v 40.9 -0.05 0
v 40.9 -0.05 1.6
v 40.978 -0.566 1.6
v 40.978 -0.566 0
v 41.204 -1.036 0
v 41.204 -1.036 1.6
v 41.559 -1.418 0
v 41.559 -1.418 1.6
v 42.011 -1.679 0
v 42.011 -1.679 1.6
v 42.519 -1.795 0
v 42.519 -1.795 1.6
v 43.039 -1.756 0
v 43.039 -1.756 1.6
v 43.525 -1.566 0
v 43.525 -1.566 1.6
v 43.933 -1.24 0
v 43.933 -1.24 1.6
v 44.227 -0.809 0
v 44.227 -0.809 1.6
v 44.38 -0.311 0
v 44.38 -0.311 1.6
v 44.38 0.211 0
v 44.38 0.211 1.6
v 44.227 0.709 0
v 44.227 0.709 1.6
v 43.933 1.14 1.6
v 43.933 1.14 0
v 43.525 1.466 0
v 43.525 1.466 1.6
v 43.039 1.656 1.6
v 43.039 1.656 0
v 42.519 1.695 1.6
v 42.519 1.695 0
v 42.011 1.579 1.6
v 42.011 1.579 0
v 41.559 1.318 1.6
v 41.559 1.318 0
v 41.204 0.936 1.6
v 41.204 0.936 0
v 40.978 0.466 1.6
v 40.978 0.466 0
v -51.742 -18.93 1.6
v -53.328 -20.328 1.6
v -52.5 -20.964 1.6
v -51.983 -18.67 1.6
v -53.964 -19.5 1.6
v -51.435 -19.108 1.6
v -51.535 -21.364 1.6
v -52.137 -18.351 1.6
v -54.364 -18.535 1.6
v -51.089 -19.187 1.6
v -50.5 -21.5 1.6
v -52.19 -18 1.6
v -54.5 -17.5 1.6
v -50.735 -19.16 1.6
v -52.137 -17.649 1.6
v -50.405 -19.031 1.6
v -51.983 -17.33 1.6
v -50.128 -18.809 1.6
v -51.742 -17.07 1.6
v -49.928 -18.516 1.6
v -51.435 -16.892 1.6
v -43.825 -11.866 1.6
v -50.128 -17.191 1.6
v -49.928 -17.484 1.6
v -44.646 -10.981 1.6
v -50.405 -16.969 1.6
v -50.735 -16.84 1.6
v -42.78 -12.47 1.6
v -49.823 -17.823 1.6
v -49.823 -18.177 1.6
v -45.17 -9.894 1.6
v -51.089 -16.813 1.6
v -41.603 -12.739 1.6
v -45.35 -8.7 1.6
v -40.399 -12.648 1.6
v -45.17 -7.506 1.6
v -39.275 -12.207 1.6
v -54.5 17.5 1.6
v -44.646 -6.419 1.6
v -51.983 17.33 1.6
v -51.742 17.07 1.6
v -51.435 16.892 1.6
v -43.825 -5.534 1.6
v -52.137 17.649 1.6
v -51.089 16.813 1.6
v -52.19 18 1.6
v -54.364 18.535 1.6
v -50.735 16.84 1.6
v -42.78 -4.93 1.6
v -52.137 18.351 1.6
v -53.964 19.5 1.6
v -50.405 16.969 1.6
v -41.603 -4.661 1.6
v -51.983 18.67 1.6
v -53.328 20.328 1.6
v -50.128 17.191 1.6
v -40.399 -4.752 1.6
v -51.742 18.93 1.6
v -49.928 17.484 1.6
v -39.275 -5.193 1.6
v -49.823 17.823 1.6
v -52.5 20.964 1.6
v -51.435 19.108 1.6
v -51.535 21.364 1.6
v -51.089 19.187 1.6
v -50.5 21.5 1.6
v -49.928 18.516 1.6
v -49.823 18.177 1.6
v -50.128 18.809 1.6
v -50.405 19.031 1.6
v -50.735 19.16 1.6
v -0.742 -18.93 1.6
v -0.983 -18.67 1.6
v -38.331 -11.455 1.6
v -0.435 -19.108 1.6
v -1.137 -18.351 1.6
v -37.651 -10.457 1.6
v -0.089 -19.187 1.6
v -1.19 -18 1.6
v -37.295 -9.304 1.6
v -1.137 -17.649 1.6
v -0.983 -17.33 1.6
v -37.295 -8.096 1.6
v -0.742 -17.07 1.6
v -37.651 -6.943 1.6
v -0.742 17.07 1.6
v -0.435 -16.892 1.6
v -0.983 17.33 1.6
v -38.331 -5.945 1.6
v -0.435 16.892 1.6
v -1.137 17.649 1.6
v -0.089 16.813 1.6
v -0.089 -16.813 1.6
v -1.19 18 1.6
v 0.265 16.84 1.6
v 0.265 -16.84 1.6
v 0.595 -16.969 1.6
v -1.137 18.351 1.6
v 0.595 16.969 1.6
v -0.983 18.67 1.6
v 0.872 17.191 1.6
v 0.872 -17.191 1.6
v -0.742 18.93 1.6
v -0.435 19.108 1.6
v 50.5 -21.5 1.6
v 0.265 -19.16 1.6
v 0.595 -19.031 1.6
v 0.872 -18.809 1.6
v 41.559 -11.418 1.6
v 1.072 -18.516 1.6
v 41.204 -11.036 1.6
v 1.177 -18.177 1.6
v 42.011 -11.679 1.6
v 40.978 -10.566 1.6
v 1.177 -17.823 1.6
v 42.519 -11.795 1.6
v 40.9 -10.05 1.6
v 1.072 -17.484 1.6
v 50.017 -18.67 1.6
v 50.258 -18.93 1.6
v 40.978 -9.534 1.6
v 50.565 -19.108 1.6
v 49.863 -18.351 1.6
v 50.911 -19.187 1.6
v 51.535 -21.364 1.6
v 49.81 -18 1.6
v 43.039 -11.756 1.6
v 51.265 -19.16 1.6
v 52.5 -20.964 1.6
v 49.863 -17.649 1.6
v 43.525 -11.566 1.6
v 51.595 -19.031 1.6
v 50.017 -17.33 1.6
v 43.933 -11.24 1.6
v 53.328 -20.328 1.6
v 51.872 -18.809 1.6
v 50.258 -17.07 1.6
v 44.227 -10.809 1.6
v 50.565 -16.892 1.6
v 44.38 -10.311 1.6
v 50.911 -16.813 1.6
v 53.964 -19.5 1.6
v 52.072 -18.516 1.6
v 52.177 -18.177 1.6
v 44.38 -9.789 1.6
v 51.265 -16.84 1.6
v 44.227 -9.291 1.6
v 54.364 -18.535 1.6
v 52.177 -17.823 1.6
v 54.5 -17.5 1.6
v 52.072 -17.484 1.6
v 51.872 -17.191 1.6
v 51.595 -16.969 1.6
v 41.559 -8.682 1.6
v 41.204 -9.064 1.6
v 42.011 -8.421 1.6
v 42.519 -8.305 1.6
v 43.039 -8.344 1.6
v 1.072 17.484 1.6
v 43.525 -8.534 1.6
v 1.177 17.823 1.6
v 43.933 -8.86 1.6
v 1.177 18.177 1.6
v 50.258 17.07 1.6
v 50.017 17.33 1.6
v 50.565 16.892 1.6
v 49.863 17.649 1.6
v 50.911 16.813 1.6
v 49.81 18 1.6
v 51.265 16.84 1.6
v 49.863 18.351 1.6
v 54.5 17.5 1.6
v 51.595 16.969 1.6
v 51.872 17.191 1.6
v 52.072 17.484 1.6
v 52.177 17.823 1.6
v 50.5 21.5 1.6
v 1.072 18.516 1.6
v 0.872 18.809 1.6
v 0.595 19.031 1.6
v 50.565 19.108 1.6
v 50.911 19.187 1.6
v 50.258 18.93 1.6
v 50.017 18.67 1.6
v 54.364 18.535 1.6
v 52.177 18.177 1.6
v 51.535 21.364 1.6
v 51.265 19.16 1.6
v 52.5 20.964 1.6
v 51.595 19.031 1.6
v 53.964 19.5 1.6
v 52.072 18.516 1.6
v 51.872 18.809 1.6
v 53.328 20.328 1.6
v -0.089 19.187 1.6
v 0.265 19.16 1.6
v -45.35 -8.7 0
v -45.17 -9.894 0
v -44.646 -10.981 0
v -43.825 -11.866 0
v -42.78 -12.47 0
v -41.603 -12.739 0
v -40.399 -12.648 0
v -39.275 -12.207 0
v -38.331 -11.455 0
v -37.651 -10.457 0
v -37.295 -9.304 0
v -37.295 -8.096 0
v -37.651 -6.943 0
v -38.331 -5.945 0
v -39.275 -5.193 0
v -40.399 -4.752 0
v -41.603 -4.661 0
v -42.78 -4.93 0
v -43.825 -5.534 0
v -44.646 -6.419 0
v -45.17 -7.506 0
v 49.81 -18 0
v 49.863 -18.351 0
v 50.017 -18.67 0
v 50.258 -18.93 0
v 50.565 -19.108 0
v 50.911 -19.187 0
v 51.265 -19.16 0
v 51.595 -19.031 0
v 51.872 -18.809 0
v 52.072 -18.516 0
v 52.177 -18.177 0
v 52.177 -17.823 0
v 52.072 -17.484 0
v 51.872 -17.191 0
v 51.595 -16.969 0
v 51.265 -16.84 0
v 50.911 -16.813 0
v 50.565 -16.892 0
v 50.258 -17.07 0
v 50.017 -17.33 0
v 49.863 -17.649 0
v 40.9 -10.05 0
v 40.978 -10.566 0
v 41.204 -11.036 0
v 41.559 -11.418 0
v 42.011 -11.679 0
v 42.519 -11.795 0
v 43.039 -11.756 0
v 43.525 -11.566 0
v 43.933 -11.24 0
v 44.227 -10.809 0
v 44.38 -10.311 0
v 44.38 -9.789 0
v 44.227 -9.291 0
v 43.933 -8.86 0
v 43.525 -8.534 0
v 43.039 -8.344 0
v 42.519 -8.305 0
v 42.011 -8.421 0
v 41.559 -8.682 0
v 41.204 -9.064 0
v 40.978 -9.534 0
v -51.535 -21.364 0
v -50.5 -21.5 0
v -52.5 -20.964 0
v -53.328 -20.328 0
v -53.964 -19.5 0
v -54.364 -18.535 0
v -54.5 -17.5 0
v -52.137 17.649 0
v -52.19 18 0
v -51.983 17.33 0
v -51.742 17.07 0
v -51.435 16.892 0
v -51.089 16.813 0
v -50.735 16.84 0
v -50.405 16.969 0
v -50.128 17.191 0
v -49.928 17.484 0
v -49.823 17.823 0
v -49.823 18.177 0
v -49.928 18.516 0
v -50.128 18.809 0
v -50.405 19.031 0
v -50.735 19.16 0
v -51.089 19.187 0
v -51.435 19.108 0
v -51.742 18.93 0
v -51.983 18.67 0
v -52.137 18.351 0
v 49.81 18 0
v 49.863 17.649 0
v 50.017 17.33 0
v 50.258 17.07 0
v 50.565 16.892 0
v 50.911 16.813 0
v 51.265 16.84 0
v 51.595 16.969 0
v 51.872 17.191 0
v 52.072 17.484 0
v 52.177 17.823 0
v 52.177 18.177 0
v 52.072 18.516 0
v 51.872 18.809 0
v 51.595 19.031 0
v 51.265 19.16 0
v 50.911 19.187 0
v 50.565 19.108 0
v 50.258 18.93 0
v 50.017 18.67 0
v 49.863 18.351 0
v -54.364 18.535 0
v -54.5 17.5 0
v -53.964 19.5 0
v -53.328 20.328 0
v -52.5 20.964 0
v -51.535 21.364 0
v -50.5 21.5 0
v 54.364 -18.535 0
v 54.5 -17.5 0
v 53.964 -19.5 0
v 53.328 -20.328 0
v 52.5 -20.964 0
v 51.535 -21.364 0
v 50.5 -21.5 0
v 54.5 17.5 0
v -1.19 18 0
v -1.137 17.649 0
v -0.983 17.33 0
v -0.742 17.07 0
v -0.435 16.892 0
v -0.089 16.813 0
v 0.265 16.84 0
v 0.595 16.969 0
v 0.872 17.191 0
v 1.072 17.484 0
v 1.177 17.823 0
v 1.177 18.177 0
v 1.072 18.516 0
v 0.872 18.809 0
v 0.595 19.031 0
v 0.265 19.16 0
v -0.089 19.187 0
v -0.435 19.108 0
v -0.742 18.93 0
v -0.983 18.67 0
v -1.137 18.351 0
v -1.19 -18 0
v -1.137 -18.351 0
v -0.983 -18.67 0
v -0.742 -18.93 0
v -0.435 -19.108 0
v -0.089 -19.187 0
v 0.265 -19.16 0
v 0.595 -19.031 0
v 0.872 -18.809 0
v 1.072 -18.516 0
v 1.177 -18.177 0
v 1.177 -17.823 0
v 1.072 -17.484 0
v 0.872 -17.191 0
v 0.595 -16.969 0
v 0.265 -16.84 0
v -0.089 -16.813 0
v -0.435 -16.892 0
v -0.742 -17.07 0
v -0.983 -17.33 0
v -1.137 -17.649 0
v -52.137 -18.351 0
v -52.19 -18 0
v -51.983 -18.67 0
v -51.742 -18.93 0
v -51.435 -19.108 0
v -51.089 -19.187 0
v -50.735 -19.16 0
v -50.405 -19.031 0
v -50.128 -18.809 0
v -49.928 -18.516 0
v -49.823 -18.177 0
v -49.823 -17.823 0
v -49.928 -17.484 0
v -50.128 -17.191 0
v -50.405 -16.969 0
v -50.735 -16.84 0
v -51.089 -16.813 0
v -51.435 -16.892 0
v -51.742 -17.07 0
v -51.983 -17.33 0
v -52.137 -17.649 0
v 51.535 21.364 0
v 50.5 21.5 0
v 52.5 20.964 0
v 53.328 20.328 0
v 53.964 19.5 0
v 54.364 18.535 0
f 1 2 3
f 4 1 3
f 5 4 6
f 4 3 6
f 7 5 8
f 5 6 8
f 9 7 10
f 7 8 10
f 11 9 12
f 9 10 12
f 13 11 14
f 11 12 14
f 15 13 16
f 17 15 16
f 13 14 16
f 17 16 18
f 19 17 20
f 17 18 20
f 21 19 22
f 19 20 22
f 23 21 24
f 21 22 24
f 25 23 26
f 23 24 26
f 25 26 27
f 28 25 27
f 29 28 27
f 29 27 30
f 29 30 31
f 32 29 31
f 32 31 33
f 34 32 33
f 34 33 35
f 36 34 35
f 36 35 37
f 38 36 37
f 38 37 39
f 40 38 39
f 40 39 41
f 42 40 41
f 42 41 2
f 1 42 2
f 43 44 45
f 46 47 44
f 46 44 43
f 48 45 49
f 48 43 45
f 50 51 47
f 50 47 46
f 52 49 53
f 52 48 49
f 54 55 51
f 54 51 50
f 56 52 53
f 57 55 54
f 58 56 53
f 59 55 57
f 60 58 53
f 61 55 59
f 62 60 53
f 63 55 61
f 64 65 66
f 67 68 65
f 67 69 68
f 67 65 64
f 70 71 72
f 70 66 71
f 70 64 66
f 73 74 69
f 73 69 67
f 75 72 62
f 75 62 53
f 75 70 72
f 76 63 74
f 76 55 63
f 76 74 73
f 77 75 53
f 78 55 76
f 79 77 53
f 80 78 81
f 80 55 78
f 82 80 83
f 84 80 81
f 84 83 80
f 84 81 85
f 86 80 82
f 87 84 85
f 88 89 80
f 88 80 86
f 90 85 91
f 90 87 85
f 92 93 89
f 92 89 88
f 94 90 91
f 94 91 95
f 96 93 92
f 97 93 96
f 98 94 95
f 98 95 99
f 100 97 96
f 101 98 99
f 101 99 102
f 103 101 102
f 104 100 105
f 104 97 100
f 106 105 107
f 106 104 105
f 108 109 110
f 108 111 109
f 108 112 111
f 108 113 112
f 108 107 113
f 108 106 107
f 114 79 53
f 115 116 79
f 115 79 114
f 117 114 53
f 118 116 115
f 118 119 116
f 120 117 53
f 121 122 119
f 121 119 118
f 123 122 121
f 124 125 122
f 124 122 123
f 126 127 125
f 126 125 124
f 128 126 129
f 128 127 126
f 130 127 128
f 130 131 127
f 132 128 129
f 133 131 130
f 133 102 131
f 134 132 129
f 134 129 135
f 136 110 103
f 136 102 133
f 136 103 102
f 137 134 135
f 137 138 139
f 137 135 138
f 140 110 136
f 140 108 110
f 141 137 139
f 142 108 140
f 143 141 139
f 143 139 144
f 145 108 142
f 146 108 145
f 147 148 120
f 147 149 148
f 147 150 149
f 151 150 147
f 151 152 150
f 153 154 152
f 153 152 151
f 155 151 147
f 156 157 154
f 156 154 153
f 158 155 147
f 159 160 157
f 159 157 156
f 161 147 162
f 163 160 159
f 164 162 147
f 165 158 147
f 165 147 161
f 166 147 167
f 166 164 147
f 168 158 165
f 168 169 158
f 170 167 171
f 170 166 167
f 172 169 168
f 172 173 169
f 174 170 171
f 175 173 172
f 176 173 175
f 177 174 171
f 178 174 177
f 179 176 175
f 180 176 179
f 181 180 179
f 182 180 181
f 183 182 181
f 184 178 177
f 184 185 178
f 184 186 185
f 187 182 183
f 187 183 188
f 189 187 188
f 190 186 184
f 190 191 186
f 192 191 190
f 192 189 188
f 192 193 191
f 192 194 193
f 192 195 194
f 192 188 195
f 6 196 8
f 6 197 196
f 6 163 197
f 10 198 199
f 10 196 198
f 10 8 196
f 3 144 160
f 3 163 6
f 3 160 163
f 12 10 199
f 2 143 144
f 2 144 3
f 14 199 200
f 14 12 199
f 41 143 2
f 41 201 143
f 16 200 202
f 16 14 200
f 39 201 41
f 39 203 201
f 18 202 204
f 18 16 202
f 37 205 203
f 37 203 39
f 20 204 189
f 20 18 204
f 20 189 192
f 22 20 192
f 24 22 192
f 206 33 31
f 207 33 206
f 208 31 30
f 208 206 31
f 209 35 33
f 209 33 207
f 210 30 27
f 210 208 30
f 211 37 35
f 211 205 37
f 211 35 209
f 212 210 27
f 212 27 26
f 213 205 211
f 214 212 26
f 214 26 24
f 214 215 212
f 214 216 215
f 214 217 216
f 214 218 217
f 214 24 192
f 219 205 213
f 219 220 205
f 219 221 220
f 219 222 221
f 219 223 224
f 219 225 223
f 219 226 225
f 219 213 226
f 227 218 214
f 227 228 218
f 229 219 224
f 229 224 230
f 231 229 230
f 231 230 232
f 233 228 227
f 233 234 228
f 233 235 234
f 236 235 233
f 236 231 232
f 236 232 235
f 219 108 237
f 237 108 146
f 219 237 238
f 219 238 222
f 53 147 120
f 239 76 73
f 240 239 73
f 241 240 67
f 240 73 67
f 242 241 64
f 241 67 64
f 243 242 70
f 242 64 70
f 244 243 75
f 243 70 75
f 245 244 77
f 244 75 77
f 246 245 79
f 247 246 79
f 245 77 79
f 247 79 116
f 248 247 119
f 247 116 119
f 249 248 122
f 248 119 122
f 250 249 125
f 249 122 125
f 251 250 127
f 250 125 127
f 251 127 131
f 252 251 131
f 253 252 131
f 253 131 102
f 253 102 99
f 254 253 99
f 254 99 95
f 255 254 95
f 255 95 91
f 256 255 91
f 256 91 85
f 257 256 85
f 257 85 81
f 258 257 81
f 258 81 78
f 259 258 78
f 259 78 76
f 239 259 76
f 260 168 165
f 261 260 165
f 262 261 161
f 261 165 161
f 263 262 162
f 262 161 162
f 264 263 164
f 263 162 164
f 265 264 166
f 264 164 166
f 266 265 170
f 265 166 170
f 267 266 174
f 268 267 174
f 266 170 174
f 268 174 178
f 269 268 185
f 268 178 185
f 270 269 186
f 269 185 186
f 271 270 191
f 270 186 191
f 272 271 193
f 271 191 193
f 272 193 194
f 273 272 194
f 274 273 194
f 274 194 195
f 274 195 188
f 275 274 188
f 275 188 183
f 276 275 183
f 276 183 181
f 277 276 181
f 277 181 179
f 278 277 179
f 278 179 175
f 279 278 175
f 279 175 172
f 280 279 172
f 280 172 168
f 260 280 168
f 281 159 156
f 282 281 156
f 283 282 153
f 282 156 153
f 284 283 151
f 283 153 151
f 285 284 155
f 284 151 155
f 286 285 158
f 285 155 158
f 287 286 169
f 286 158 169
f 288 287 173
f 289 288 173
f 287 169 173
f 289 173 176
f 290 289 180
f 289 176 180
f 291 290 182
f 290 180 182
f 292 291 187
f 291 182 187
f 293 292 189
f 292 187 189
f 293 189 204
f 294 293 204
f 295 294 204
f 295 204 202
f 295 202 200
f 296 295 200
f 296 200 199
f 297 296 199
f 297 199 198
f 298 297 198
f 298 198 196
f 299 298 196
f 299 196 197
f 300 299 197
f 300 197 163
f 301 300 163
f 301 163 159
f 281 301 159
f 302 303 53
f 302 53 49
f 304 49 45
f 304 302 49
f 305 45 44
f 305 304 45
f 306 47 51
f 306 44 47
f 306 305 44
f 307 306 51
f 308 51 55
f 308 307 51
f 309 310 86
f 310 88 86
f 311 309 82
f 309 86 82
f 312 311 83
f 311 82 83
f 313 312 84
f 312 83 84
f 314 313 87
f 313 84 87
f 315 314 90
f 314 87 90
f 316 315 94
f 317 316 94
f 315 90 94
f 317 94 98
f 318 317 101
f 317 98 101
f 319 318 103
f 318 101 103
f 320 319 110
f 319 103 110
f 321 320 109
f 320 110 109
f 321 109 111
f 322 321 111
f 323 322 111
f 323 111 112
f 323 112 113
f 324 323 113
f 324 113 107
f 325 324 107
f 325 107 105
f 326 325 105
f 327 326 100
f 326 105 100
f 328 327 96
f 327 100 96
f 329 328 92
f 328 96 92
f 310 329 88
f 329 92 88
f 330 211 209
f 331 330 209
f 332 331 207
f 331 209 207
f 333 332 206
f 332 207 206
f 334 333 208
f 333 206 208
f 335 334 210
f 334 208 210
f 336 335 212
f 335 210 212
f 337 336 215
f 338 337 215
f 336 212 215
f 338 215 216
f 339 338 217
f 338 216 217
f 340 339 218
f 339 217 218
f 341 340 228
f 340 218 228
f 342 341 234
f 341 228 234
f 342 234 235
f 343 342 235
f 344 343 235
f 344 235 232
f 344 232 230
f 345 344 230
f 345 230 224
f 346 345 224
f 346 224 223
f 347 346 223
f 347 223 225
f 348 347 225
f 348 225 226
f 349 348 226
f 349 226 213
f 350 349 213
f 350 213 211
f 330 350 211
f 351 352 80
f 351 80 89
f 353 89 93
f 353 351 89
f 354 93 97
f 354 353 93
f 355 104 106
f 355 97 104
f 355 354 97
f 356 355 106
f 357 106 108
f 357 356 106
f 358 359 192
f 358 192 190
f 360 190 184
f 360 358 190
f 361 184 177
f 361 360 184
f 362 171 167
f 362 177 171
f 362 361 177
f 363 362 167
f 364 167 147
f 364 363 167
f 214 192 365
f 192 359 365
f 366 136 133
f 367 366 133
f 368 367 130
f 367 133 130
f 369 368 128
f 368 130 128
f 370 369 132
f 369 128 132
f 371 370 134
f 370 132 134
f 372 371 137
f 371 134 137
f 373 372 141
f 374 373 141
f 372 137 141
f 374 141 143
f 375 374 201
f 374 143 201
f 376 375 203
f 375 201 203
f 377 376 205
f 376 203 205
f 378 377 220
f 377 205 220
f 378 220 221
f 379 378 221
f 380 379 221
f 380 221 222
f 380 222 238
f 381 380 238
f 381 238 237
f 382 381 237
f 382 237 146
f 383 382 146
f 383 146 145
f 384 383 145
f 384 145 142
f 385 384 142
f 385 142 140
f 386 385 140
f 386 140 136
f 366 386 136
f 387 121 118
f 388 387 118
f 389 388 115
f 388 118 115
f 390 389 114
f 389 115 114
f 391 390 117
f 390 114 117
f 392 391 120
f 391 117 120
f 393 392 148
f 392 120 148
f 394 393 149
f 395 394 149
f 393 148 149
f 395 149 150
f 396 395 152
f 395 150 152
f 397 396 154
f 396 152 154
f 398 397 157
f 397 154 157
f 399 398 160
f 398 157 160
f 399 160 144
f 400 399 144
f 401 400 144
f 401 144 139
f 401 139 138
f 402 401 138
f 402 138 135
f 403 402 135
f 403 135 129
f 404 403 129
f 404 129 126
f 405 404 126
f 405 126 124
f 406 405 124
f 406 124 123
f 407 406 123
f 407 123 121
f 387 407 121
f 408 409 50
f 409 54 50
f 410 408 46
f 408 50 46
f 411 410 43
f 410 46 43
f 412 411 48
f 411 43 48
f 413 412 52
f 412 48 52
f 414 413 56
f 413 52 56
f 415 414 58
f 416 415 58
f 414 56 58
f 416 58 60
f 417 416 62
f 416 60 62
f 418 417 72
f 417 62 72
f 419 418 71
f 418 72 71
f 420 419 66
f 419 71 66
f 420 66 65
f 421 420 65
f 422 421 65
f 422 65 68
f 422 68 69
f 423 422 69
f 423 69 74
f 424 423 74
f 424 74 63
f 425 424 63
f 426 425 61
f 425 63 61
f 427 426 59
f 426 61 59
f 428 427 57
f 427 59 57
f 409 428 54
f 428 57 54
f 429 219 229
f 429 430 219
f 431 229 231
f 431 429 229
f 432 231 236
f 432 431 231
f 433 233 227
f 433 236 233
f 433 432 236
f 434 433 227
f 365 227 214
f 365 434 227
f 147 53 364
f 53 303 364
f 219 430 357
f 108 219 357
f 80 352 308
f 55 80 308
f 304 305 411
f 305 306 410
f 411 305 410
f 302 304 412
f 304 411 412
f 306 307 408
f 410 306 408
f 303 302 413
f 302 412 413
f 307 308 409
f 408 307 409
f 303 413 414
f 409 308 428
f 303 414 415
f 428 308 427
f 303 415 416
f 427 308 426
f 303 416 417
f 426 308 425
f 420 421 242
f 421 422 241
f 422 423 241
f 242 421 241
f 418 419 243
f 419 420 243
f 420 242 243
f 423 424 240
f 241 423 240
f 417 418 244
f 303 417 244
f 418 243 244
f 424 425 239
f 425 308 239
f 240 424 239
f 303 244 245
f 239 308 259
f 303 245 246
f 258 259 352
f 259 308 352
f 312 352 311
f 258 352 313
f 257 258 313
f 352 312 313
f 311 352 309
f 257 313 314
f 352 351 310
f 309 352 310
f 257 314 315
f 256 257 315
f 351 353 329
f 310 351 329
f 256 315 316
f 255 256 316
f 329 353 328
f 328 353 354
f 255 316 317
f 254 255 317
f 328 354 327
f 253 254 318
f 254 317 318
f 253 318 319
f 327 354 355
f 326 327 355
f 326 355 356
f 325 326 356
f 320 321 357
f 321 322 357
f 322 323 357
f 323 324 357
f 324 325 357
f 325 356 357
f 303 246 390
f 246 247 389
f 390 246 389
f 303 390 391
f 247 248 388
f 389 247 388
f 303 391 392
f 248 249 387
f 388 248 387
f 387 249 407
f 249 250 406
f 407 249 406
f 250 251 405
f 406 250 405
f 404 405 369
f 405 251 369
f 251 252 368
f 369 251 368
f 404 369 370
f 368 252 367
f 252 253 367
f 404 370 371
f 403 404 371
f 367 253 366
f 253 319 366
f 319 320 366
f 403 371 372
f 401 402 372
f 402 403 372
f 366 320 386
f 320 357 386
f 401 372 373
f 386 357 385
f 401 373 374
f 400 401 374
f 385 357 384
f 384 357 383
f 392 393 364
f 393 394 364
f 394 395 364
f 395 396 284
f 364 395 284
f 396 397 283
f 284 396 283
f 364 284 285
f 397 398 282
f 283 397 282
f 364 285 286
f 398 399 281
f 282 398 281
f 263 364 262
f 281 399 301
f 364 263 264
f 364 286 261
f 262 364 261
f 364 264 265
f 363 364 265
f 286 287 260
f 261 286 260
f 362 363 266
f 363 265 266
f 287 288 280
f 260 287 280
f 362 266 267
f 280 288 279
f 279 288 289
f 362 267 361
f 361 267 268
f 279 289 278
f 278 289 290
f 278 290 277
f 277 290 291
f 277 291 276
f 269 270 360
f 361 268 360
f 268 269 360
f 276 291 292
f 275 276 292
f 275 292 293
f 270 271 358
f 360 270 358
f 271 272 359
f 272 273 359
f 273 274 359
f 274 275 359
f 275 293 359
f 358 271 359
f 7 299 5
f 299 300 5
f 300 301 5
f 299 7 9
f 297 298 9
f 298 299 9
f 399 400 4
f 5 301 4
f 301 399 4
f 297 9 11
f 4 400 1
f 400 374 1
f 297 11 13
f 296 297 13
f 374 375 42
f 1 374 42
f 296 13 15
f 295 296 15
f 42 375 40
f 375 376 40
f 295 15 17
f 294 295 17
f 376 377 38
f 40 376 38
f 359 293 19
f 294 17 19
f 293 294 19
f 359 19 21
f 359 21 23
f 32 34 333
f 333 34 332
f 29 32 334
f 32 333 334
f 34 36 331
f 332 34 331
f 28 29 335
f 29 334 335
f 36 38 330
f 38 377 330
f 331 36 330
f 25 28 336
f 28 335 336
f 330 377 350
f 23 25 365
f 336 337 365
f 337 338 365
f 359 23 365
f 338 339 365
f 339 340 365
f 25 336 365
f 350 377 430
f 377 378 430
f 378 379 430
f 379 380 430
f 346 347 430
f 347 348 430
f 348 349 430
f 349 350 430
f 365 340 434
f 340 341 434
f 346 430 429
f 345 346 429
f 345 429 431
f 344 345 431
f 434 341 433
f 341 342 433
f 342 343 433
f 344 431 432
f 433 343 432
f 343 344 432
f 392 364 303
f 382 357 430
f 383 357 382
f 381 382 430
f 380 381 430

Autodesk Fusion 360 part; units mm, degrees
sketch "Main Body" plane through (0, 0, 0) normal (0, 0, 1) x (1, 0, 0)
  line L0 (50.5, 21.5) -> (-50.5, 21.5)
  line L1 (-54.5, 17.5) -> (-54.5, -17.5)
  line L2 (-50.5, -21.5) -> (50.5, -21.5)
  line L3 (54.5, -17.5) -> (54.5, 17.5)
  arc A0 (-50.5, 21.5) -> (-54.5, 17.5) centre (-50.5, 17.5) ccw
  arc A1 (-54.5, -17.5) -> (-50.5, -21.5) centre (-50.5, -17.5) ccw
  arc A2 (50.5, -21.5) -> (54.5, -17.5) centre (50.5, -17.5) ccw
  arc A3 (54.5, 17.5) -> (50.5, 21.5) centre (50.5, 17.5) ccw
  line L4 (-54.5, 0) -> (54.5, 0) construction
  line L5 (0, 21.5) -> (0, -21.5) construction
  dimension "d3" = 4
  dimension "d4" = 4
  dimension "d5" = 4
  dimension "d6" = 4
  dimension "d7" = 109
  dimension "d8" = 43
extrude "Extrude1" add sketch "Main Body" along normal blind 1.6
sketch "Screw Holes" plane through (0, 0, 1.6) normal (0, 0, 1) x (-1, 0, 0)
  arc A0 (-54.5, -17.5) -> (-50.5, -21.5) centre (-50.5, -17.5) ccw
  line L0 (-50.5, -21.5) -> (50.5, -21.5)
  arc A1 (50.5, -21.5) -> (54.5, -17.5) centre (50.5, -17.5) ccw
  line L1 (54.5, -17.5) -> (54.5, 17.5)
  arc A2 (54.5, 17.5) -> (50.5, 21.5) centre (50.5, 17.5) ccw
  line L2 (50.5, 21.5) -> (-50.5, 21.5)
  arc A3 (-50.5, 21.5) -> (-54.5, 17.5) centre (-50.5, 17.5) ccw
  line L3 (-54.5, 17.5) -> (-54.5, -17.5)
  circle A4 centre (-51, 18) radius 1.19
  line L4 (51, 0) -> (-51, 0) construction
  line L5 (0, -18) -> (0, 18) construction
  line L6 (-51, -18) -> (-51, 18) construction
  line L7 (51, -18) -> (51, 18) construction
  circle A5 centre (-51, -18) radius 1.19
  circle A6 centre (0, 18) radius 1.19
  circle A7 centre (0, -18) radius 1.19
  circle A8 centre (51, -18) radius 1.19
  circle A9 centre (51, 18) radius 1.19
  dimension "d11" = 2.38
  dimension "d12" = 102
  dimension "d13" = 36
  dimension "d14" = 36
  dimension "d15" = 36
  dimension "d16" = 2.38
  dimension "d17" = 2.38
  dimension "d18" = 2.38
  dimension "d19" = 2.38
  dimension "d20" = 2.38
extrude "Extrude2" cut sketch "Screw Holes" against normal blind 1.6 contours A4 | A5 | A6 | A7 | A8 | A9
sketch "Button Holes" plane through (0, 0, 1.6) normal (0, 0, 1) x (-1, 0, 0)
  circle A0 centre (0, 18) radius 1.19
  circle A1 centre (0, -18) radius 1.19
  circle A2 centre (51, -18) radius 1.19
  circle A3 centre (-51, 18) radius 1.19
  circle A4 centre (-51, -18) radius 1.19
  circle A5 centre (51, 18) radius 1.19
  arc A6 (-54.5, -17.5) -> (-50.5, -21.5) centre (-50.5, -17.5) ccw
  line L0 (-50.5, -21.5) -> (50.5, -21.5)
  arc A7 (50.5, -21.5) -> (54.5, -17.5) centre (50.5, -17.5) ccw
  line L1 (54.5, -17.5) -> (54.5, 17.5)
  arc A8 (54.5, 17.5) -> (50.5, 21.5) centre (50.5, 17.5) ccw
  line L2 (50.5, 21.5) -> (-50.5, 21.5)
  arc A9 (-50.5, 21.5) -> (-54.5, 17.5) centre (-50.5, 17.5) ccw
  line L3 (-54.5, 17.5) -> (-54.5, -17.5)
  line L4 (-42.65, 0.05) -> (-42.65, 10.05) construction
  circle A10 centre (-42.65, 0.05) radius 1.75
  circle A11 centre (-42.65, 10.05) radius 1.75
  line L5 (0, 0) -> (-42.65, 0) construction
  line L6 (-42.65, 0) -> (-42.65, 0.05)
  dimension "d23" = 10
  dimension "d24" = 3.5
  dimension "d25" = 3.5
  dimension "d26" = 42.65
  dimension "d27" = 0.05
extrude "Extrude3" cut sketch "Button Holes" against normal blind 1.6 contours A10 | A11
sketch "Power Jack Hole" plane through (0, 0, 1.6) normal (0, 0, 1) x (-1, 0, 0)
  circle A0 centre (-42.65, 0.05) radius 1.75
  circle A1 centre (-42.65, 10.05) radius 1.75
  circle A2 centre (0, 18) radius 1.19
  circle A3 centre (0, -18) radius 1.19
  circle A4 centre (51, -18) radius 1.19
  circle A5 centre (-51, 18) radius 1.19
  circle A6 centre (-51, -18) radius 1.19
  circle A7 centre (51, 18) radius 1.19
  arc A8 (-54.5, -17.5) -> (-50.5, -21.5) centre (-50.5, -17.5) ccw
  line L0 (-50.5, -21.5) -> (50.5, -21.5)
  arc A9 (50.5, -21.5) -> (54.5, -17.5) centre (50.5, -17.5) ccw
  line L1 (54.5, -17.5) -> (54.5, 17.5)
  arc A10 (54.5, 17.5) -> (50.5, 21.5) centre (50.5, 17.5) ccw
  line L2 (50.5, 21.5) -> (-50.5, 21.5)
  arc A11 (-50.5, 21.5) -> (-54.5, 17.5) centre (-50.5, 17.5) ccw
  line L3 (-54.5, 17.5) -> (-54.5, -17.5)
  line L4 (0, 0) -> (41.3, 0) construction
  line L5 (41.3, 0) -> (41.3, 8.7) construction
  circle A12 centre (41.3, 8.7) radius 4.05
  dimension "d30" = 41.3
  dimension "d31" = 8.7
  dimension "d32" = 8.1
extrude "Extrude4" cut sketch "Power Jack Hole" against normal blind 1.6 contours A12
